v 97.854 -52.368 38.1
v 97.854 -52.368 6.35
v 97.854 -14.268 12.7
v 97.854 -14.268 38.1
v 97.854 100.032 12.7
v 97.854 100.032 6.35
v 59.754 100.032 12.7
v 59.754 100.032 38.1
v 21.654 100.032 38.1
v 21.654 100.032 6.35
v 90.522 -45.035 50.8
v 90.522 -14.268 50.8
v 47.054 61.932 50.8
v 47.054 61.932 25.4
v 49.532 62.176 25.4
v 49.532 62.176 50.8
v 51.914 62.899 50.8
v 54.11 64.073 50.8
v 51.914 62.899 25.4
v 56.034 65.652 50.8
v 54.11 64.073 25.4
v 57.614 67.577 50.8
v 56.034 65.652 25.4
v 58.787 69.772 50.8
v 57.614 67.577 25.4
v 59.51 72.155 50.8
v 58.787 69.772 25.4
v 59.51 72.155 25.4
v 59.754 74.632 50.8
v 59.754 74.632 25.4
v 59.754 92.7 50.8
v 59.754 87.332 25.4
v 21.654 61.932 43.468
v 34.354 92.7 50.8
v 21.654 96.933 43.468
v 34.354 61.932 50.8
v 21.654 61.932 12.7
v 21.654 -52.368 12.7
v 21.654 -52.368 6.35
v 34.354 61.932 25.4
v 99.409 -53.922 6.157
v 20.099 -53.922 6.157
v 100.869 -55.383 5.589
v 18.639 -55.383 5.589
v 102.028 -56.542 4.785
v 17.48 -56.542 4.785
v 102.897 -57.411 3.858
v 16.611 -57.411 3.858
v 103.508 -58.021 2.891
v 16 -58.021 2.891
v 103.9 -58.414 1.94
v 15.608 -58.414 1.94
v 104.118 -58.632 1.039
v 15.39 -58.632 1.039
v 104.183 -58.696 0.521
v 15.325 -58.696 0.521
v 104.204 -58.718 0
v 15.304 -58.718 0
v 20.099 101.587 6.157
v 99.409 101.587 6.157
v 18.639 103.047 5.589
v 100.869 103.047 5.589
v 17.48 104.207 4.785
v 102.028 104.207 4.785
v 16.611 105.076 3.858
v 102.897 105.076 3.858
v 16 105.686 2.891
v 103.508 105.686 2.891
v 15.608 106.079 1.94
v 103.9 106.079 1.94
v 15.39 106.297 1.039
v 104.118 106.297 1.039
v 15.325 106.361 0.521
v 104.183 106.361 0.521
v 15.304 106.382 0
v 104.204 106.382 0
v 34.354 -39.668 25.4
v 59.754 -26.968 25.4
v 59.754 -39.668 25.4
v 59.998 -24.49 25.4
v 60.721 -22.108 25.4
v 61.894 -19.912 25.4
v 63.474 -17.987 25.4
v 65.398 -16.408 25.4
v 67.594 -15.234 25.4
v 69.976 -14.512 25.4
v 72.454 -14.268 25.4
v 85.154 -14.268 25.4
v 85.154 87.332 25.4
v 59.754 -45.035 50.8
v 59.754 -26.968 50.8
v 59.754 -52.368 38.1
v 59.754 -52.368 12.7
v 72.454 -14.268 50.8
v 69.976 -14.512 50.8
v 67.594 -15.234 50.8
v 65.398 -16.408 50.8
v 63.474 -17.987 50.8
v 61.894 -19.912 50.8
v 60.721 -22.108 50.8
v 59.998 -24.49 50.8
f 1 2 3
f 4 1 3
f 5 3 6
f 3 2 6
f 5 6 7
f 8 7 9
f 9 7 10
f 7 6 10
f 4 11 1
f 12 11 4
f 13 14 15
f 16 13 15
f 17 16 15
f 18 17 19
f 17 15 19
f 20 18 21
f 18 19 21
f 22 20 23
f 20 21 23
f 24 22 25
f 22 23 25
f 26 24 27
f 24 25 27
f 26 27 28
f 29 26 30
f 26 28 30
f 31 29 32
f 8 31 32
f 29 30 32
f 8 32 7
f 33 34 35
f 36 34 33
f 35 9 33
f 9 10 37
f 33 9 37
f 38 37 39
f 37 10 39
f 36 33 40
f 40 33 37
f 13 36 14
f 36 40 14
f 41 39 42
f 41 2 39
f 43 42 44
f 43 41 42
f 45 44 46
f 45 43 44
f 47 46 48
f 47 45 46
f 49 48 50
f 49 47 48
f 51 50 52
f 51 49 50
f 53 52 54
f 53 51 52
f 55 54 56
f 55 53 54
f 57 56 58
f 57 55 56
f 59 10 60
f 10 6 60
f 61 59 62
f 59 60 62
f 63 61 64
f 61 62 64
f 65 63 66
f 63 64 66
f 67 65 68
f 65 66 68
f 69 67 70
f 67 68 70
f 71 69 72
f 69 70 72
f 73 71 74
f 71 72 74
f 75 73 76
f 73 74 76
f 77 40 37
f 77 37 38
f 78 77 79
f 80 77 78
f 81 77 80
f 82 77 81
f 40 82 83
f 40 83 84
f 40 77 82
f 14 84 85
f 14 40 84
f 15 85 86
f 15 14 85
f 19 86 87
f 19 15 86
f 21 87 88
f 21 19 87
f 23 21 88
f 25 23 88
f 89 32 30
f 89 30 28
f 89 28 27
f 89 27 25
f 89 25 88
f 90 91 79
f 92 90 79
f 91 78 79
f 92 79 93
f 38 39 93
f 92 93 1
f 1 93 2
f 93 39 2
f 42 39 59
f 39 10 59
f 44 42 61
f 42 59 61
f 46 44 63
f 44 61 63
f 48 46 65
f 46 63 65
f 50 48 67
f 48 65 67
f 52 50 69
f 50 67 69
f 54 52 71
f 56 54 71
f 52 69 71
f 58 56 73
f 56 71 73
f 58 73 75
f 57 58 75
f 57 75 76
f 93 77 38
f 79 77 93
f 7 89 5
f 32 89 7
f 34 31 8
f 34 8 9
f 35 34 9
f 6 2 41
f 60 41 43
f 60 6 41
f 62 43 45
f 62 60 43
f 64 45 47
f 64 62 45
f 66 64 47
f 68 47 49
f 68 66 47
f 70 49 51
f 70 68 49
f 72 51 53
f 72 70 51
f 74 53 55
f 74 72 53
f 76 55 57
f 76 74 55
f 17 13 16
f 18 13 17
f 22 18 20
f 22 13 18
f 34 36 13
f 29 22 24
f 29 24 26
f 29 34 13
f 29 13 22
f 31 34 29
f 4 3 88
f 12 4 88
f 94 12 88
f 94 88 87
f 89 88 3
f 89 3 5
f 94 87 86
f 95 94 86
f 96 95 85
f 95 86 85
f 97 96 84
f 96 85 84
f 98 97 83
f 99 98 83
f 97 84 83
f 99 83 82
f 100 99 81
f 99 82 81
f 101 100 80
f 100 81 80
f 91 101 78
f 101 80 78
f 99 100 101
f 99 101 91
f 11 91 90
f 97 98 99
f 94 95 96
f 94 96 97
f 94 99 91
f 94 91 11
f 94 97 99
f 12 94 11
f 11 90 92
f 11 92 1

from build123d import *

# Parameters (mm, degrees)
F0_W        = 88.9
F0_H        = 165.1
F1_DEPTH    = 6.35
F2_DEPTH    = 25.4
F3_DEPTH    = 50.8
F4_R        = 6.34999
F5_SIZE2    = 12.7
F5_SIZE     = 12.7
F6_C1_SIZE2 = 12.7
F6_C1_SIZE  = 7.3323484187
F6_C2_SIZE2 = 7.3323484187
F6_C2_SIZE  = 12.7
F6_C3_SIZE2 = 7.3323484187
F6_C3_SIZE  = 12.7
F6_C4_SIZE2 = 7.3323484187
F6_C4_SIZE  = 12.7


# Not quite as in the source:
# - a fillet or chamfer is up to 0.001 mm smaller than in the source, because OpenCascade refuses the exact size


with BuildPart() as f1:
    # F0 (on Top) → F1 (new body)
    with BuildSketch(Plane.XY):
        with Locations((59.7539862376, 23.8323401288)):
            Rectangle(F0_W, F0_H)
        Polygon((21.6539862376, 61.9323401288), (21.6539862376, 100.0323401288), (59.7539862376, 100.0323401288), (97.8539862376, 100.0323401288), (97.8539862376, -14.2676598712), (97.8539862376, -52.3676598712), (59.7539862376, -52.3676598712), (21.6539862376, -52.3676598712), align=None, mode=Mode.SUBTRACT)
    extrude(amount=F1_DEPTH)

    # F0 (on Top) → F2 (join)
    with BuildSketch(Plane.XY):
        with BuildLine():
            Line((97.8539862376, 100.0323401288), (59.7539862376, 100.0323401288))
            Line((59.7539862376, 100.0323401288), (59.7539862376, 74.6323401288))
            ThreePointArc((59.7539862376, 74.6323401288), (56.0342423587, 65.6520840077), (47.0539862376, 61.9323401288))
            Line((47.0539862376, 61.9323401288), (21.6539862376, 61.9323401288))
            Line((21.6539862376, 61.9323401288), (21.6539862376, -52.3676598712))
            Line((21.6539862376, -52.3676598712), (59.7539862376, -52.3676598712))
            Line((59.7539862376, -52.3676598712), (59.7539862376, -26.9676598712))
            ThreePointArc((59.7539862376, -26.9676598712), (63.4737301166, -17.9874037501), (72.4539862376, -14.2676598712))
            Line((72.4539862376, -14.2676598712), (97.8539862376, -14.2676598712))
            Line((97.8539862376, -14.2676598712), (97.8539862376, 100.0323401288))
        make_face()
    extrude(amount=F2_DEPTH)

    # F0 (on Top) → F3 (join)
    with BuildSketch(Plane.XY):
        with BuildLine():
            Line((59.7539862376, 100.0323401288), (21.6539862376, 100.0323401288))
            Line((21.6539862376, 100.0323401288), (21.6539862376, 61.9323401288))
            Line((21.6539862376, 61.9323401288), (47.0539862376, 61.9323401288))
            ThreePointArc((47.0539862376, 61.9323401288), (56.0342423587, 65.6520840077), (59.7539862376, 74.6323401288))
            Line((59.7539862376, 74.6323401288), (59.7539862376, 100.0323401288))
        make_face()
        with BuildLine():
            Line((97.8539862376, -52.3676598712), (97.8539862376, -14.2676598712))
            Line((97.8539862376, -14.2676598712), (72.4539862376, -14.2676598712))
            ThreePointArc((72.4539862376, -14.2676598712), (63.4737301166, -17.9874037501), (59.7539862376, -26.9676598712))
            Line((59.7539862376, -26.9676598712), (59.7539862376, -52.3676598712))
            Line((59.7539862376, -52.3676598712), (97.8539862376, -52.3676598712))
        make_face()
    extrude(amount=F3_DEPTH)

    # F4 (radius 6.35 in the source; OpenCascade refuses exactly that, so slightly less here)
    f4_edges = [f1.edges().sort_by_distance(p)[0] for p in [
        (15.303986, 23.83234, 6.35),
        (59.753986, 106.38234, 6.35),
        (59.753986, -58.71766, 6.35),
        (104.203986, 23.83234, 6.35),
    ]]
    fillet(f4_edges, radius=F4_R)

    # F5
    f5_edges = [f1.edges().sort_by_distance(p)[0] for p in [
        (21.653986, 4.78234, 25.4),
        (40.703986, -52.36766, 25.4),
        (97.853986, 42.88234, 25.4),
        (78.803986, 100.03234, 25.4),
    ]]
    chamfer(f5_edges, length=F5_SIZE, length2=F5_SIZE2)

    # F6: chamfer of 12.7 x 7.3323484187 on 4 edges, made by hand

    # F6_c1
    f6_c1_edges = [f1.edges().sort_by_distance(p)[0] for p in [
        (21.6539862376, 80.9823401288, 50.8),
    ]]
    f6_c1_side = f1.faces().sort_by_distance((21.6539862376, 80.9823401288, 50.6533530316))[0]
    chamfer(f6_c1_edges, length=F6_C1_SIZE, length2=F6_C1_SIZE2, reference=f6_c1_side)

    # F6_c2
    f6_c2_edges = [f1.edges().sort_by_distance(p)[0] for p in [
        (78.8039862376, -52.3676598712, 50.8),
    ]]
    f6_c2_side = f1.faces().sort_by_distance((78.8039862376, -52.3676598712, 50.6533530316))[0]
    chamfer(f6_c2_edges, length=F6_C2_SIZE, length2=F6_C2_SIZE2, reference=f6_c2_side)

    # F6_c3
    f6_c3_edges = [f1.edges().sort_by_distance(p)[0] for p in [
        (47.0539862376, 100.0323401288, 50.8),
    ]]
    f6_c3_side = f1.faces().sort_by_distance((47.0539862376, 100.0323401288, 50.6533530316))[0]
    chamfer(f6_c3_edges, length=F6_C3_SIZE, length2=F6_C3_SIZE2, reference=f6_c3_side)

    # F6_c4
    f6_c4_edges = [f1.edges().sort_by_distance(p)[0] for p in [
        (97.8539862376, -29.6514856618, 50.8),
    ]]
    f6_c4_side = f1.faces().sort_by_distance((97.8539862376, -29.6514856618, 50.6533530316))[0]
    chamfer(f6_c4_edges, length=F6_C4_SIZE, length2=F6_C4_SIZE2, reference=f6_c4_side)


solid = f1.part
